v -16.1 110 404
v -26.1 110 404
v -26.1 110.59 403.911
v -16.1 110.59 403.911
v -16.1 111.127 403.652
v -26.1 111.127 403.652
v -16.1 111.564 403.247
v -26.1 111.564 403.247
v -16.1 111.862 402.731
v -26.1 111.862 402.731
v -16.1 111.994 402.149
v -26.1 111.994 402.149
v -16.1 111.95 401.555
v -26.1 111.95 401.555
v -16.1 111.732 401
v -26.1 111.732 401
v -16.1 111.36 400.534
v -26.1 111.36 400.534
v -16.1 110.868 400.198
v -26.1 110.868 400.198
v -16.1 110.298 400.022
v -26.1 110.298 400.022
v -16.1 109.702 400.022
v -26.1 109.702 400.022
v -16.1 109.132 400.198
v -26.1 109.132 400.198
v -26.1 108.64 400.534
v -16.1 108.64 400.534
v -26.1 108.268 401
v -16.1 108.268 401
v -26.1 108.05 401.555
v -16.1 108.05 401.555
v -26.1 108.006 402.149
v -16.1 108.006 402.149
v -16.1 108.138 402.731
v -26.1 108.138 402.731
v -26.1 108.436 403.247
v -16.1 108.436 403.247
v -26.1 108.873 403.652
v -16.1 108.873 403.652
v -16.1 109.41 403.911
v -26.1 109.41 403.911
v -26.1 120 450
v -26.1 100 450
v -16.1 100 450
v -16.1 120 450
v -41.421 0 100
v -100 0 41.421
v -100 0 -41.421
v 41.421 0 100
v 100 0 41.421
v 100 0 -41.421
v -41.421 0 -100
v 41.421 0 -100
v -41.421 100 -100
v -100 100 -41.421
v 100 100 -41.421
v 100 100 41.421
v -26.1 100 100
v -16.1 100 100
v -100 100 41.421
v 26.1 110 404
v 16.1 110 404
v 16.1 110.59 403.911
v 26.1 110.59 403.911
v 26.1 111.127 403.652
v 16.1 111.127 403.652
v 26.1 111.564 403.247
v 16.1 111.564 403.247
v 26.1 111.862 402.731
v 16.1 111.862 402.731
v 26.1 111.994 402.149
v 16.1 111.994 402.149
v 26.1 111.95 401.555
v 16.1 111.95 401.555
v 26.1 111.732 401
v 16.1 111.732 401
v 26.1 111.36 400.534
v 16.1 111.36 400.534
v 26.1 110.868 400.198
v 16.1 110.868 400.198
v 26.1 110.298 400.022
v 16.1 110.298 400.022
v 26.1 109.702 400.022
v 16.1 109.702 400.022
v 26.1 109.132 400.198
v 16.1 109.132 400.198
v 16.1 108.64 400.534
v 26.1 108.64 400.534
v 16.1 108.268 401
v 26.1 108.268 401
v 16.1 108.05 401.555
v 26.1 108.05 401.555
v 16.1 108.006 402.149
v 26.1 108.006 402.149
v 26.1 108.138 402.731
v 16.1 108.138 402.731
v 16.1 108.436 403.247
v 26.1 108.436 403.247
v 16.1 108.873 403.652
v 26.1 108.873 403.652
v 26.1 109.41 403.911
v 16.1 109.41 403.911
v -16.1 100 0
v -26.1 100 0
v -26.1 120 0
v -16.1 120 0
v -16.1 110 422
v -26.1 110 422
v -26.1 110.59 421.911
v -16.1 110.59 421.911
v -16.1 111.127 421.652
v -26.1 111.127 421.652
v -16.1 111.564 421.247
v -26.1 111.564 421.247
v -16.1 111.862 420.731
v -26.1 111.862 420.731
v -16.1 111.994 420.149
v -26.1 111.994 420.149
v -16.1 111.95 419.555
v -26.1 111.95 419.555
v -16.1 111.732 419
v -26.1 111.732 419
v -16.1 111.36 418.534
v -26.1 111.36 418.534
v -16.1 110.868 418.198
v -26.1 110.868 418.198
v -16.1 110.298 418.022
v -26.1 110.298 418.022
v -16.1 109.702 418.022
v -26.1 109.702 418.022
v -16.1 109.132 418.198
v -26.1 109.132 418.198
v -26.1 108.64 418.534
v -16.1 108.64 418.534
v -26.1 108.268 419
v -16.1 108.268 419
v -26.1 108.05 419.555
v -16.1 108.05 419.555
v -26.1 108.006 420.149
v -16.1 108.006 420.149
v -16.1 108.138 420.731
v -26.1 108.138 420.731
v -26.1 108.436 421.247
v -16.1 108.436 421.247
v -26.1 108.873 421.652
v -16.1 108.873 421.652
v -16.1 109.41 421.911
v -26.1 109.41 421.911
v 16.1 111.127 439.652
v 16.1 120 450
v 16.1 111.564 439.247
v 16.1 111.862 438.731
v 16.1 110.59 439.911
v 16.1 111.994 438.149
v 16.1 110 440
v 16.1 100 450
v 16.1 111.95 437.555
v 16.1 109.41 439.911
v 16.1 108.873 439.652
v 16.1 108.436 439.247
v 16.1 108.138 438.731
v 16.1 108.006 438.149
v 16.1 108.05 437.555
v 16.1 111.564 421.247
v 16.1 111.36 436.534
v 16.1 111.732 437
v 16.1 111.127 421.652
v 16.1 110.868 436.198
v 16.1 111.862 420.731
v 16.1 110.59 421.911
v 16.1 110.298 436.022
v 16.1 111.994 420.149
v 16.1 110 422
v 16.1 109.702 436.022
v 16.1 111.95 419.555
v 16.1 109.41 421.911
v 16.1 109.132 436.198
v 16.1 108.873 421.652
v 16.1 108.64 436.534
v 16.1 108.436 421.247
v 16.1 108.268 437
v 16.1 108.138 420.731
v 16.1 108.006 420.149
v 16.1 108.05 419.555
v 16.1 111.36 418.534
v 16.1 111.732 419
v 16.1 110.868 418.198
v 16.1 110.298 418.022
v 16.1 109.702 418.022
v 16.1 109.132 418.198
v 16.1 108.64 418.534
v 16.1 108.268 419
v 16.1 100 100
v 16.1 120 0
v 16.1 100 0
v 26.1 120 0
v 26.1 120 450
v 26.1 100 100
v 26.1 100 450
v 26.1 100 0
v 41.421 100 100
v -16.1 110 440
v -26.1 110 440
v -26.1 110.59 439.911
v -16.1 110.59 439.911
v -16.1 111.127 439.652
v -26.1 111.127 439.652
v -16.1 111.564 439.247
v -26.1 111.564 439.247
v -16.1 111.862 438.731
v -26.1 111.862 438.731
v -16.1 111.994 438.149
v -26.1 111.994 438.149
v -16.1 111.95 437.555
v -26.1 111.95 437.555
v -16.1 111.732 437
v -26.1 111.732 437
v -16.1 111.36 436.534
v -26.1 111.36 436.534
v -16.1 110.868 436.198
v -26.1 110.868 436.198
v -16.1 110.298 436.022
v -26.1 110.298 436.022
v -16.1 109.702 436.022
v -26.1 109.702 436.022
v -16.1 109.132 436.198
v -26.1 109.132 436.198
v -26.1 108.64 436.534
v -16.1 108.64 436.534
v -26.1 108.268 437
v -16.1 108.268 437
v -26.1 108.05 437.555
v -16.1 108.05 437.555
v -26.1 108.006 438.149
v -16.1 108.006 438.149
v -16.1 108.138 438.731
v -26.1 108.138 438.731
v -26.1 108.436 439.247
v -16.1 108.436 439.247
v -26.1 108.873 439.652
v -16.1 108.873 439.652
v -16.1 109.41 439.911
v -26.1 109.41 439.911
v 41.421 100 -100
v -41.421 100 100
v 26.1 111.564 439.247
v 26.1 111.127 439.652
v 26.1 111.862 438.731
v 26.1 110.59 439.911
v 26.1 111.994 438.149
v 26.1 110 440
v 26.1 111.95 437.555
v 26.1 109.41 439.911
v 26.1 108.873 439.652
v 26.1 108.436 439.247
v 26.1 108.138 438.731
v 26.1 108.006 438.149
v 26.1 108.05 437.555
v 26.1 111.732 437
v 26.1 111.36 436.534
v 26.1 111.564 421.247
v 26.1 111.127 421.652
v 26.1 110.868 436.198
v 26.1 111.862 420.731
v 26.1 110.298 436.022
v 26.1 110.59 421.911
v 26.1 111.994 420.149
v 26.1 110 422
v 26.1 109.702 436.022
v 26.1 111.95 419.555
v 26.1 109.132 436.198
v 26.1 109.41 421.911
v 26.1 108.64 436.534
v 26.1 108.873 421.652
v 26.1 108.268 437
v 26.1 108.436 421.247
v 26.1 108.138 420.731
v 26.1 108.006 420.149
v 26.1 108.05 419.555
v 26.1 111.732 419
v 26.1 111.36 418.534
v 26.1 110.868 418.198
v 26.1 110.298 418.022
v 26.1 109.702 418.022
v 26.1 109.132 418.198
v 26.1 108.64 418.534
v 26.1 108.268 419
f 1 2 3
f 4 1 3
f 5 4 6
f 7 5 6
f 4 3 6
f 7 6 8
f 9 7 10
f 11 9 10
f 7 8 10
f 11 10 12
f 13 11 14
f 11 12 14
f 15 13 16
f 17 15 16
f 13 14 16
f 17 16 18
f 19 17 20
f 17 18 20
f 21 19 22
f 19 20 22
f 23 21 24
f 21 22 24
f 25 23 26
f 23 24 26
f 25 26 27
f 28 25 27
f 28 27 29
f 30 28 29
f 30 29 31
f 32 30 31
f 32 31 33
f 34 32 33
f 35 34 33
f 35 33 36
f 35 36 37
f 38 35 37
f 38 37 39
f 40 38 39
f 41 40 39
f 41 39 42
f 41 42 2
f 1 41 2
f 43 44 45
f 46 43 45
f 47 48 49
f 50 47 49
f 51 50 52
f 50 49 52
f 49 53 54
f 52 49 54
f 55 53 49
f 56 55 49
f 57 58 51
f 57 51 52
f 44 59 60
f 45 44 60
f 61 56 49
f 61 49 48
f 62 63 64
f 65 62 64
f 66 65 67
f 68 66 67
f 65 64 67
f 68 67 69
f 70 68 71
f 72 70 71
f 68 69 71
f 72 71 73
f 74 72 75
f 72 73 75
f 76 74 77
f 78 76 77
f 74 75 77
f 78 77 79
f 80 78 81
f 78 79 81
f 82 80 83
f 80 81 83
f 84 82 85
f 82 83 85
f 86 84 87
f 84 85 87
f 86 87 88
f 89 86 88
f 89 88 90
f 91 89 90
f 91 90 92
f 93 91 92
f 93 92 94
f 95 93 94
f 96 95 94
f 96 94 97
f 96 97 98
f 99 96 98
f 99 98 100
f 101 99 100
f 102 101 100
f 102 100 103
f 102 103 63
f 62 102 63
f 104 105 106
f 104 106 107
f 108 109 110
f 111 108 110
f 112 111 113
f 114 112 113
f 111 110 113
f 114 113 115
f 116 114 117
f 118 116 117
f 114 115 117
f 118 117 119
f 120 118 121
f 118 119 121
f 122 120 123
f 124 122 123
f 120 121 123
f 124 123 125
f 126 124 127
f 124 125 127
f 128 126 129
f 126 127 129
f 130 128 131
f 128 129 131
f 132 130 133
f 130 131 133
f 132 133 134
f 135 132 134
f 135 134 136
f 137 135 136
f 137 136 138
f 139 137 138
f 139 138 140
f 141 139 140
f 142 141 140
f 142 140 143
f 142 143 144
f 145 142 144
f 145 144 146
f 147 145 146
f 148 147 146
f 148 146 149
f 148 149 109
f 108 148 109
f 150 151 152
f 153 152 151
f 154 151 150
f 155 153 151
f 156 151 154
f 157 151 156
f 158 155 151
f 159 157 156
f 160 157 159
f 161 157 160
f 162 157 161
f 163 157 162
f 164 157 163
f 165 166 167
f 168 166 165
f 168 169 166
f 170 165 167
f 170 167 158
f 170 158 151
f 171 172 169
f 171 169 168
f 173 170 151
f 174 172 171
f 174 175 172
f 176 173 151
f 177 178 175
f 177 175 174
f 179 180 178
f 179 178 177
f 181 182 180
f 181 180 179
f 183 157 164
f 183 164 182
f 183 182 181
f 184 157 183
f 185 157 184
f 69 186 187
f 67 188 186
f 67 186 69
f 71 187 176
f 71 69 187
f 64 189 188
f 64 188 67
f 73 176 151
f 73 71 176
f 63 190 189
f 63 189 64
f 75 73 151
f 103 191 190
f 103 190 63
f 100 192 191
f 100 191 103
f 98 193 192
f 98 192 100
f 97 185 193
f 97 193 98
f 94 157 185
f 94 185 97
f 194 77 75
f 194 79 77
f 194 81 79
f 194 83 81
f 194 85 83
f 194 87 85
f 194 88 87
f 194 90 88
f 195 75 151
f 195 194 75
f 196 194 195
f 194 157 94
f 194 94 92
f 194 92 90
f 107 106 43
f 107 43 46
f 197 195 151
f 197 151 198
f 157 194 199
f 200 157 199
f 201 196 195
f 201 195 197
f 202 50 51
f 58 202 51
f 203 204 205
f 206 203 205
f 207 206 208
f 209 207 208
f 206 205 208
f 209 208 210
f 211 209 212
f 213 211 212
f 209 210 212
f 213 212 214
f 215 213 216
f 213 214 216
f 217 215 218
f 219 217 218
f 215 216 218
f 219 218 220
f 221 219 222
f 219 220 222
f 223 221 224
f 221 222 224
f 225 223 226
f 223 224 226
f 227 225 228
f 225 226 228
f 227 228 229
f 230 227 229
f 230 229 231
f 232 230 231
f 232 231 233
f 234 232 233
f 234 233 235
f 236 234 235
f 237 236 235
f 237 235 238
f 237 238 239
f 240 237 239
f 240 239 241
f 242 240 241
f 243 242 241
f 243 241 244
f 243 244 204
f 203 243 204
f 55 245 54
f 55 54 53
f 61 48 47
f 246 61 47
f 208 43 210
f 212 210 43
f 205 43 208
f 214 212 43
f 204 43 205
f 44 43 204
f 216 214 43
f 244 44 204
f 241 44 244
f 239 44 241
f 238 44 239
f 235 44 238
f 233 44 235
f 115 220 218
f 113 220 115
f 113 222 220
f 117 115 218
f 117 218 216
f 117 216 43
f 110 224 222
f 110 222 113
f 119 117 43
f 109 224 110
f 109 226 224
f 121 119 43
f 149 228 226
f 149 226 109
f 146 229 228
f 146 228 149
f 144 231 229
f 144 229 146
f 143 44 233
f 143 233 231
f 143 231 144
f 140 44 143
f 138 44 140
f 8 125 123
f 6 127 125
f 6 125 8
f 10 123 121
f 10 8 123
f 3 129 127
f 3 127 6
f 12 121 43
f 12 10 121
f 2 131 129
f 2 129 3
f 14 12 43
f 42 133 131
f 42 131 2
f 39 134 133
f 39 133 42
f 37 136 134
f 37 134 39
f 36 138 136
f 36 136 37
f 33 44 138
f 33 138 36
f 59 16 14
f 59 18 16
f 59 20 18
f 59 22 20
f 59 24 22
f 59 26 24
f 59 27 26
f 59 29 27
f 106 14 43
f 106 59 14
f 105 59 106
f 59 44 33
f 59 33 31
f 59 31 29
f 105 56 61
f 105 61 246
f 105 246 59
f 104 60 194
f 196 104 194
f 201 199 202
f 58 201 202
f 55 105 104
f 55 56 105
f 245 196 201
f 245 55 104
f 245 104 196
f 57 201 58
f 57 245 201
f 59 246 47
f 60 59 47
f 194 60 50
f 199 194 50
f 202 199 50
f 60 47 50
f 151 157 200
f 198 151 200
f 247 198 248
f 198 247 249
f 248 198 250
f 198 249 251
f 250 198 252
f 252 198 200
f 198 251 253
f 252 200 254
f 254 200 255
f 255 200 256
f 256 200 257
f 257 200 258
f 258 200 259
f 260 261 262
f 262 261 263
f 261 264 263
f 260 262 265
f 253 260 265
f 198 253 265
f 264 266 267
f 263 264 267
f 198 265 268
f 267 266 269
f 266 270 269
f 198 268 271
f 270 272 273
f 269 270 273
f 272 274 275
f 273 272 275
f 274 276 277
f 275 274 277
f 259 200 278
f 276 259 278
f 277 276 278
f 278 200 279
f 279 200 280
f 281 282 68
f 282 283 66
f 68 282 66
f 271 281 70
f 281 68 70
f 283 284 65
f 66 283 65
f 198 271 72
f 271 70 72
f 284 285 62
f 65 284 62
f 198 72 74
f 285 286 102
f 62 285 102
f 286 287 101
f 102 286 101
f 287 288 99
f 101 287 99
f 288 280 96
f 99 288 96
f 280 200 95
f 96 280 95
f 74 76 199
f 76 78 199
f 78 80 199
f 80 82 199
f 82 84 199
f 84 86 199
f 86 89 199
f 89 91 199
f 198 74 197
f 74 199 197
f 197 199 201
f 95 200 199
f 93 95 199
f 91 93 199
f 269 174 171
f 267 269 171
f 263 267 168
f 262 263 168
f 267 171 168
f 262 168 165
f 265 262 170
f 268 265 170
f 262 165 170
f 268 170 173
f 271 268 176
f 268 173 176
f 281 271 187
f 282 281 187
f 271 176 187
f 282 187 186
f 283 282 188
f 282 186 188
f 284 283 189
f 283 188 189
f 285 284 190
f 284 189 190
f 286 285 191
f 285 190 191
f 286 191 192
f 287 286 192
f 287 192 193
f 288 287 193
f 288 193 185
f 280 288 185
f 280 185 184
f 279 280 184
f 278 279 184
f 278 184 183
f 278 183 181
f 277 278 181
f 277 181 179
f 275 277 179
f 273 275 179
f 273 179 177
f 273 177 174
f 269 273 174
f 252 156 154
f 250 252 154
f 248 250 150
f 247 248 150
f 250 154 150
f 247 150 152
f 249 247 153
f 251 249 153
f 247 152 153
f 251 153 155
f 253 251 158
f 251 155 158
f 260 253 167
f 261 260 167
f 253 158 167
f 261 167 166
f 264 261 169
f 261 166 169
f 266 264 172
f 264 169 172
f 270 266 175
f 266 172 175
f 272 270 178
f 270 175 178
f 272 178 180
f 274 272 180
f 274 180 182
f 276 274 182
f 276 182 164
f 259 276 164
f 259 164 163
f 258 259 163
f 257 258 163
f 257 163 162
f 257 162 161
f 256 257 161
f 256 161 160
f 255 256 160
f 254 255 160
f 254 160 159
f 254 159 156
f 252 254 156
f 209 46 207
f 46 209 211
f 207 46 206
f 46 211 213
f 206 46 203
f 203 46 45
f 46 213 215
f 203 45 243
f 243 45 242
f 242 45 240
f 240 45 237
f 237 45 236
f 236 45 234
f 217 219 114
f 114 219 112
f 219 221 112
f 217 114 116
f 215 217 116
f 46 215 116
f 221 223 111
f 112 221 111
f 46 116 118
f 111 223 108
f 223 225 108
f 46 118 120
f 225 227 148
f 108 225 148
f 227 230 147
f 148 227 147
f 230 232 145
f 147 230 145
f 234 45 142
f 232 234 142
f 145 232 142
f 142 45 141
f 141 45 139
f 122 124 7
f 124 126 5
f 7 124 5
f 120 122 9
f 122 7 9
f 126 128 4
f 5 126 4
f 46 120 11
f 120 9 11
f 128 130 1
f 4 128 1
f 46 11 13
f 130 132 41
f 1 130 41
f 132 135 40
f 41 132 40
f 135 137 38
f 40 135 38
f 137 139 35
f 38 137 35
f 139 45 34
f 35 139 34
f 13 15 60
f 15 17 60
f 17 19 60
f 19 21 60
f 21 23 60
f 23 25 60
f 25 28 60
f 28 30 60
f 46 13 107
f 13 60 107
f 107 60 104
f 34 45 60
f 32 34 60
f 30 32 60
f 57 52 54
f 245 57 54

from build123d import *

# Parameters (mm, degrees)
BOSS_EXTRUDE1_DEPTH = 100
SKETCH2_W           = 10
SKETCH2_H           = 450
BOSS_EXTRUDE2_DEPTH = 20
SKETCH3_R           = 2
CUT_EXTRUDE1_DEPTH  = 483.494777174


with BuildPart() as part:
    # Sketch1 → Boss-Extrude1 (new body)
    with BuildSketch(Plane(origin=(0, 0, 0), x_dir=(1, 0, 0), z_dir=(0, 1, 0))):
        Polygon((100, -41.421356237), (100, 41.421356237), (41.421356237, 100), (-41.421356237, 100), (-100, 41.421356237), (-100, -41.421356237), (-41.421356237, -100), (41.421356237, -100), align=None)
    extrude(amount=BOSS_EXTRUDE1_DEPTH)

    # Sketch2 → Boss-Extrude2 (add)
    with BuildSketch(Plane(origin=(0, 100, 0), x_dir=(1, 0, 0), z_dir=(0, 1, 0))):
        with Locations((-21.1, -225)):
            Rectangle(SKETCH2_W, SKETCH2_H)
        with Locations((21.1, -225)):
            Rectangle(SKETCH2_W, SKETCH2_H)
    extrude(amount=BOSS_EXTRUDE2_DEPTH)

    # Sketch3 → Cut-Extrude1 (cut, through all)
    with BuildSketch(Plane.ZY.offset(26.1)):
        with Locations((438, 110)):
            Circle(SKETCH3_R)
        with Locations((420, 110)):
            Circle(SKETCH3_R)
        with Locations((402, 110)):
            Circle(SKETCH3_R)
    extrude(amount=-CUT_EXTRUDE1_DEPTH, mode=Mode.SUBTRACT)


solid = part.part
